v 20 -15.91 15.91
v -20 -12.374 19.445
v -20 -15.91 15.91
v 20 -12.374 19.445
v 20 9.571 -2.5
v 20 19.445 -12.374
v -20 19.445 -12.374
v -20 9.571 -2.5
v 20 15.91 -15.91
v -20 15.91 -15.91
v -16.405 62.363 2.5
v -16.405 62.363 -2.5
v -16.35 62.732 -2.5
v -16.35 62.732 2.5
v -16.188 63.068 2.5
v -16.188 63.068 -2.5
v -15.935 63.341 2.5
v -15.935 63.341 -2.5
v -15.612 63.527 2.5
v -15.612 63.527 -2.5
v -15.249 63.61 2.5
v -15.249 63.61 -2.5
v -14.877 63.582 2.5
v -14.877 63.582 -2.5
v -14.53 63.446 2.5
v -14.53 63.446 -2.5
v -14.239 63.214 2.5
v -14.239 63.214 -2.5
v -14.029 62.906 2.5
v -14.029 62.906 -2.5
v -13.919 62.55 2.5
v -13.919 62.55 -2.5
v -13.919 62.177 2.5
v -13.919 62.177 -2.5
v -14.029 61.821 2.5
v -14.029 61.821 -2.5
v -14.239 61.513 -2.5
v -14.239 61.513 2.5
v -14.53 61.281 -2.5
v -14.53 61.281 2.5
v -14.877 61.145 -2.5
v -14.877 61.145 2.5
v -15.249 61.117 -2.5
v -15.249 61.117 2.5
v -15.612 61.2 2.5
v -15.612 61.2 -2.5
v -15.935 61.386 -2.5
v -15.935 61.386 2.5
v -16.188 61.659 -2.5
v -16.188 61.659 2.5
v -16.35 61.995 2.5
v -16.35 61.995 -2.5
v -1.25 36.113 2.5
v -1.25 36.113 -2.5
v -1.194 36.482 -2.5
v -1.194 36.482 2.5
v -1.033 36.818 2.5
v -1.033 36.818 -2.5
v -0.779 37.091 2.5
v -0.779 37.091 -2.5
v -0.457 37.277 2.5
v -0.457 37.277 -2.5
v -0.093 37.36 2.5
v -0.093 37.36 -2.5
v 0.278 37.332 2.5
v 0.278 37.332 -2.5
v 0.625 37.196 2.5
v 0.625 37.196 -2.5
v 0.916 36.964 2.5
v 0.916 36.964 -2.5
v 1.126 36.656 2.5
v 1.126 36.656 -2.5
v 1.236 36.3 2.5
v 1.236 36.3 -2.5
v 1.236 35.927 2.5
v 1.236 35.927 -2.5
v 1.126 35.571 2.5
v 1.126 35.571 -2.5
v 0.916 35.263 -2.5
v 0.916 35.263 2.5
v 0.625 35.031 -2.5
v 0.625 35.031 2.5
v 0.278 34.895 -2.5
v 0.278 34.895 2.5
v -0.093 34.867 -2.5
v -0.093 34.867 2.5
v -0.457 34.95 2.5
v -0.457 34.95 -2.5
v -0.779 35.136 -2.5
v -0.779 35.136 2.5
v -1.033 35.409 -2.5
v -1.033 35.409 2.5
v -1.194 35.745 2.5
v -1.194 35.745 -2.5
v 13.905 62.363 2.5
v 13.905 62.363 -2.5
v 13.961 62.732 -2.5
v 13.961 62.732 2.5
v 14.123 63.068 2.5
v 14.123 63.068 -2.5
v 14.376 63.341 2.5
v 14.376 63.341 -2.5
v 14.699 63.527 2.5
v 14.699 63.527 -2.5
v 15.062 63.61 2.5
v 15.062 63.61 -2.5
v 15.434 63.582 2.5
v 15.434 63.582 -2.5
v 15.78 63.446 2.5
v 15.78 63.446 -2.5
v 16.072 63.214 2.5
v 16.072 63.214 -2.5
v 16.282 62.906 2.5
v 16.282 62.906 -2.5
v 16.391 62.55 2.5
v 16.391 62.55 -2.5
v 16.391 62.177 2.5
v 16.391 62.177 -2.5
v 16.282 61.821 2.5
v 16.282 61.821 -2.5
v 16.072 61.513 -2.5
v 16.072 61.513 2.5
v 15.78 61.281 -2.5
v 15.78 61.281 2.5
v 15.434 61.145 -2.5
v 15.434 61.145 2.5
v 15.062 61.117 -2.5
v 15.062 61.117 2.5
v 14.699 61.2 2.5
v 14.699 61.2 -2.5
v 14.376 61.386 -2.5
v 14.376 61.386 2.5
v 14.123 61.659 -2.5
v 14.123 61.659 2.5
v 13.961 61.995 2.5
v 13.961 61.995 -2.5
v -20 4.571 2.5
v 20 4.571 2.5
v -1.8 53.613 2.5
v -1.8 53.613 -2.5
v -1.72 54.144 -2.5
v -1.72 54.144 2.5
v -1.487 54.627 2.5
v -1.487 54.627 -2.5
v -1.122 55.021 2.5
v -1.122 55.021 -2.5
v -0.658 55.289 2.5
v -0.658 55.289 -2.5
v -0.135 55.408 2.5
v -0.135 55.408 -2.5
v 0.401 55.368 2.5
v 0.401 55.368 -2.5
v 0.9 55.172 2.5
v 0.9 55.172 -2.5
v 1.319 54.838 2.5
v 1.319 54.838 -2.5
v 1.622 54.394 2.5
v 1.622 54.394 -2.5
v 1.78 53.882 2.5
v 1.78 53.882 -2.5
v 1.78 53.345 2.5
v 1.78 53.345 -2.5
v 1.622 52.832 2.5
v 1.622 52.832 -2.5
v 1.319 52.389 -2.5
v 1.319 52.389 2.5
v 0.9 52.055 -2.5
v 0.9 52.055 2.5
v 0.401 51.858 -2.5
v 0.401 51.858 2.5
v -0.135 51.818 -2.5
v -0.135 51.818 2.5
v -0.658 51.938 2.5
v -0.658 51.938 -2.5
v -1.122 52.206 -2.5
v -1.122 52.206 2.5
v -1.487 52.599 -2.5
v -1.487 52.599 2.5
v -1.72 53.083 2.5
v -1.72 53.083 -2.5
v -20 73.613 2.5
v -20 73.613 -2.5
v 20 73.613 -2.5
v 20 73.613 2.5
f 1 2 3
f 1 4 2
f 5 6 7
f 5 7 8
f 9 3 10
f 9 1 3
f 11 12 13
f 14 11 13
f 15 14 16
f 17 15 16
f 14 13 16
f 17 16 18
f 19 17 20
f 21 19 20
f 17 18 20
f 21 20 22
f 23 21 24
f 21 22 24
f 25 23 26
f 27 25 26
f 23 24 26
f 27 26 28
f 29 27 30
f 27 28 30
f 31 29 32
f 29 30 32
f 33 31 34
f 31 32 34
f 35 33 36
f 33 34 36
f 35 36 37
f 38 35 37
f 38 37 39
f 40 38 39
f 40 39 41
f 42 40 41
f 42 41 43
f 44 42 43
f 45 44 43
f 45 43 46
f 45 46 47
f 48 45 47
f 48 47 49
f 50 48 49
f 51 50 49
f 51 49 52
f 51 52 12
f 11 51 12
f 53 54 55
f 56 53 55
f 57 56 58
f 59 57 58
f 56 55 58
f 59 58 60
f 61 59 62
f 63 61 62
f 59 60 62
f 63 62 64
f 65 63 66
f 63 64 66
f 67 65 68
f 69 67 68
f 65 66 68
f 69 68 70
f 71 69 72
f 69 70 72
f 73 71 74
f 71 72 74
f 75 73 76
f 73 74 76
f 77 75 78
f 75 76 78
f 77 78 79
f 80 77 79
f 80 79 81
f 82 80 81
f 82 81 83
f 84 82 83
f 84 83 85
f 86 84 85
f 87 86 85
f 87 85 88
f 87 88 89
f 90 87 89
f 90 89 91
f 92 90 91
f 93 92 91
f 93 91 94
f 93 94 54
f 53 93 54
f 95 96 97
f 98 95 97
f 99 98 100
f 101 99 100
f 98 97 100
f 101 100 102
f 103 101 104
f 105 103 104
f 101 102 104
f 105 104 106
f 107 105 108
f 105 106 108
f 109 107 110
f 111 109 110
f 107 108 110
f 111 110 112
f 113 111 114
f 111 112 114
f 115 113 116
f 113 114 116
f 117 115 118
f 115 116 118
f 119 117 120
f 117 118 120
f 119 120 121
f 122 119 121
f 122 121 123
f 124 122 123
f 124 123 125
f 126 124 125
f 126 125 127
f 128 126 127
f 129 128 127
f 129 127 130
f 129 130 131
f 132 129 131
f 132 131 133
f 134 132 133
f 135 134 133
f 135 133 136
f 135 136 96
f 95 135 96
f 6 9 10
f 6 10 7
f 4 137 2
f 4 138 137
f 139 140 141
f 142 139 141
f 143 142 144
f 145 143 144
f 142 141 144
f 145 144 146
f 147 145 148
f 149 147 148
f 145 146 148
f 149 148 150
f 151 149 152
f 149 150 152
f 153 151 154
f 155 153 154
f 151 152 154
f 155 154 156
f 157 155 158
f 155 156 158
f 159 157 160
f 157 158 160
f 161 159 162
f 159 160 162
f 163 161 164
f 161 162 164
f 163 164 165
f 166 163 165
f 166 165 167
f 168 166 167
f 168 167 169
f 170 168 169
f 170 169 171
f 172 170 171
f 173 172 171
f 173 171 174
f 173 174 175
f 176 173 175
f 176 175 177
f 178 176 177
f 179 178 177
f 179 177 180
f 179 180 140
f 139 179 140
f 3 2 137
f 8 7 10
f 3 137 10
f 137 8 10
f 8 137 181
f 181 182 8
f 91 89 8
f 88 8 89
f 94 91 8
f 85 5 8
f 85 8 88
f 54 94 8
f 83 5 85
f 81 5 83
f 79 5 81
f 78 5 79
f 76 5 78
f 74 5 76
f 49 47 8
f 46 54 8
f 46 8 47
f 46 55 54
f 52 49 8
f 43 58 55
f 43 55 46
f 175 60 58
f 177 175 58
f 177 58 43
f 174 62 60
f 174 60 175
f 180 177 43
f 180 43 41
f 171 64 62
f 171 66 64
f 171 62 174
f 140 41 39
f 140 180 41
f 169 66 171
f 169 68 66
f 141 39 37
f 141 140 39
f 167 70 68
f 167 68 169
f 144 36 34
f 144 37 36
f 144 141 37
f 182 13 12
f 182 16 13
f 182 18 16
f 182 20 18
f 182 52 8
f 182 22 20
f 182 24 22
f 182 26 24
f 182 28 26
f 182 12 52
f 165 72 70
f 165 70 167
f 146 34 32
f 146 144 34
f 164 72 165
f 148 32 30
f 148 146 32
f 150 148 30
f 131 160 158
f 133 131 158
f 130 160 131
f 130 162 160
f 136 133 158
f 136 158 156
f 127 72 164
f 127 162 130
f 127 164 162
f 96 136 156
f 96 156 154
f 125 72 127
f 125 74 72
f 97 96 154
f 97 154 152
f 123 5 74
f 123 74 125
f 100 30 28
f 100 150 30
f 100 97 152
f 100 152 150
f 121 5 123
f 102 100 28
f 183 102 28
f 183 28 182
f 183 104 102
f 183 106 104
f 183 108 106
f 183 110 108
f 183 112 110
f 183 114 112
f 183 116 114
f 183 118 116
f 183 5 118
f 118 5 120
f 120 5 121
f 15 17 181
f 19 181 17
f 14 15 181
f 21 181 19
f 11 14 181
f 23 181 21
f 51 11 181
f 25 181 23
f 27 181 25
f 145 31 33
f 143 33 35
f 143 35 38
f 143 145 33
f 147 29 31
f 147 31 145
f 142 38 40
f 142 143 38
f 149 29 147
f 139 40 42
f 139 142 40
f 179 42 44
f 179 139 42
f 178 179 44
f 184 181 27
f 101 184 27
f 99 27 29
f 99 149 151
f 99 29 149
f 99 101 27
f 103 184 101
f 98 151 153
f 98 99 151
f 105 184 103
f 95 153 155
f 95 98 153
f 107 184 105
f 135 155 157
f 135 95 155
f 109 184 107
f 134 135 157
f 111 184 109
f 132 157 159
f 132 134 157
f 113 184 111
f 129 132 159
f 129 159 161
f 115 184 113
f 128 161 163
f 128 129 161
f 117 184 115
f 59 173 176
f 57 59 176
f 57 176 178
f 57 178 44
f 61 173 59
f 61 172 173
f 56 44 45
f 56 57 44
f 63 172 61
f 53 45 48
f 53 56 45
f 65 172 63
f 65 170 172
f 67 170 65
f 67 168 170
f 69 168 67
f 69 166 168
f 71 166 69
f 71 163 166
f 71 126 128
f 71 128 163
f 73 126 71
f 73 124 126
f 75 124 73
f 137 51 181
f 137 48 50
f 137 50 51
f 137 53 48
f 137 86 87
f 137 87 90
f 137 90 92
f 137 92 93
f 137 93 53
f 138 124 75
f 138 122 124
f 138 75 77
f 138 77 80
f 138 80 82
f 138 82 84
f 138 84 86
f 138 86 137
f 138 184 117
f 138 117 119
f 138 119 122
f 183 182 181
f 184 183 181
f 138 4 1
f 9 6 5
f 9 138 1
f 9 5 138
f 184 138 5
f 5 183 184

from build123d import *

# Parameters (mm, degrees)
BOSS_EXTRUDE1_DEPTH   = 20
M3X0_5_TAPPED_HOLE1_D = 2.5
M3_CLEARANCE_HOLE1_D  = 3.6


with BuildPart() as part:
    # Sketch1 → Boss-Extrude1 (new, symmetric)
    with BuildSketch(Plane(origin=(0, 0, 0), x_dir=(0, 0, -1), z_dir=(1, 0, 0))):
        Polygon((-15.909902577, -15.909902577), (15.909902577, 15.909902577), (12.374368671, 19.445436483), (2.5, 9.571067812), (2.5, 73.613363655), (-2.5, 73.613363655), (-2.5, 4.571067812), (-19.445436483, -12.374368671), align=None)
    extrude(amount=BOSS_EXTRUDE1_DEPTH, both=True)

    # M3x0.5 Tapped Hole1 (through all)
    with Locations(Plane.XY.offset(2.5)):
        with Locations((-15.155444566, 62.363363655), (15.155444566, 62.363363655), (0, 36.113363655)):
            Hole(M3X0_5_TAPPED_HOLE1_D / 2)

    # M3 Clearance Hole1 (through all)
    with Locations(Plane.XY.offset(2.5)):
        with Locations((0, 53.613363655)):
            Hole(M3_CLEARANCE_HOLE1_D / 2)


solid = part.part
